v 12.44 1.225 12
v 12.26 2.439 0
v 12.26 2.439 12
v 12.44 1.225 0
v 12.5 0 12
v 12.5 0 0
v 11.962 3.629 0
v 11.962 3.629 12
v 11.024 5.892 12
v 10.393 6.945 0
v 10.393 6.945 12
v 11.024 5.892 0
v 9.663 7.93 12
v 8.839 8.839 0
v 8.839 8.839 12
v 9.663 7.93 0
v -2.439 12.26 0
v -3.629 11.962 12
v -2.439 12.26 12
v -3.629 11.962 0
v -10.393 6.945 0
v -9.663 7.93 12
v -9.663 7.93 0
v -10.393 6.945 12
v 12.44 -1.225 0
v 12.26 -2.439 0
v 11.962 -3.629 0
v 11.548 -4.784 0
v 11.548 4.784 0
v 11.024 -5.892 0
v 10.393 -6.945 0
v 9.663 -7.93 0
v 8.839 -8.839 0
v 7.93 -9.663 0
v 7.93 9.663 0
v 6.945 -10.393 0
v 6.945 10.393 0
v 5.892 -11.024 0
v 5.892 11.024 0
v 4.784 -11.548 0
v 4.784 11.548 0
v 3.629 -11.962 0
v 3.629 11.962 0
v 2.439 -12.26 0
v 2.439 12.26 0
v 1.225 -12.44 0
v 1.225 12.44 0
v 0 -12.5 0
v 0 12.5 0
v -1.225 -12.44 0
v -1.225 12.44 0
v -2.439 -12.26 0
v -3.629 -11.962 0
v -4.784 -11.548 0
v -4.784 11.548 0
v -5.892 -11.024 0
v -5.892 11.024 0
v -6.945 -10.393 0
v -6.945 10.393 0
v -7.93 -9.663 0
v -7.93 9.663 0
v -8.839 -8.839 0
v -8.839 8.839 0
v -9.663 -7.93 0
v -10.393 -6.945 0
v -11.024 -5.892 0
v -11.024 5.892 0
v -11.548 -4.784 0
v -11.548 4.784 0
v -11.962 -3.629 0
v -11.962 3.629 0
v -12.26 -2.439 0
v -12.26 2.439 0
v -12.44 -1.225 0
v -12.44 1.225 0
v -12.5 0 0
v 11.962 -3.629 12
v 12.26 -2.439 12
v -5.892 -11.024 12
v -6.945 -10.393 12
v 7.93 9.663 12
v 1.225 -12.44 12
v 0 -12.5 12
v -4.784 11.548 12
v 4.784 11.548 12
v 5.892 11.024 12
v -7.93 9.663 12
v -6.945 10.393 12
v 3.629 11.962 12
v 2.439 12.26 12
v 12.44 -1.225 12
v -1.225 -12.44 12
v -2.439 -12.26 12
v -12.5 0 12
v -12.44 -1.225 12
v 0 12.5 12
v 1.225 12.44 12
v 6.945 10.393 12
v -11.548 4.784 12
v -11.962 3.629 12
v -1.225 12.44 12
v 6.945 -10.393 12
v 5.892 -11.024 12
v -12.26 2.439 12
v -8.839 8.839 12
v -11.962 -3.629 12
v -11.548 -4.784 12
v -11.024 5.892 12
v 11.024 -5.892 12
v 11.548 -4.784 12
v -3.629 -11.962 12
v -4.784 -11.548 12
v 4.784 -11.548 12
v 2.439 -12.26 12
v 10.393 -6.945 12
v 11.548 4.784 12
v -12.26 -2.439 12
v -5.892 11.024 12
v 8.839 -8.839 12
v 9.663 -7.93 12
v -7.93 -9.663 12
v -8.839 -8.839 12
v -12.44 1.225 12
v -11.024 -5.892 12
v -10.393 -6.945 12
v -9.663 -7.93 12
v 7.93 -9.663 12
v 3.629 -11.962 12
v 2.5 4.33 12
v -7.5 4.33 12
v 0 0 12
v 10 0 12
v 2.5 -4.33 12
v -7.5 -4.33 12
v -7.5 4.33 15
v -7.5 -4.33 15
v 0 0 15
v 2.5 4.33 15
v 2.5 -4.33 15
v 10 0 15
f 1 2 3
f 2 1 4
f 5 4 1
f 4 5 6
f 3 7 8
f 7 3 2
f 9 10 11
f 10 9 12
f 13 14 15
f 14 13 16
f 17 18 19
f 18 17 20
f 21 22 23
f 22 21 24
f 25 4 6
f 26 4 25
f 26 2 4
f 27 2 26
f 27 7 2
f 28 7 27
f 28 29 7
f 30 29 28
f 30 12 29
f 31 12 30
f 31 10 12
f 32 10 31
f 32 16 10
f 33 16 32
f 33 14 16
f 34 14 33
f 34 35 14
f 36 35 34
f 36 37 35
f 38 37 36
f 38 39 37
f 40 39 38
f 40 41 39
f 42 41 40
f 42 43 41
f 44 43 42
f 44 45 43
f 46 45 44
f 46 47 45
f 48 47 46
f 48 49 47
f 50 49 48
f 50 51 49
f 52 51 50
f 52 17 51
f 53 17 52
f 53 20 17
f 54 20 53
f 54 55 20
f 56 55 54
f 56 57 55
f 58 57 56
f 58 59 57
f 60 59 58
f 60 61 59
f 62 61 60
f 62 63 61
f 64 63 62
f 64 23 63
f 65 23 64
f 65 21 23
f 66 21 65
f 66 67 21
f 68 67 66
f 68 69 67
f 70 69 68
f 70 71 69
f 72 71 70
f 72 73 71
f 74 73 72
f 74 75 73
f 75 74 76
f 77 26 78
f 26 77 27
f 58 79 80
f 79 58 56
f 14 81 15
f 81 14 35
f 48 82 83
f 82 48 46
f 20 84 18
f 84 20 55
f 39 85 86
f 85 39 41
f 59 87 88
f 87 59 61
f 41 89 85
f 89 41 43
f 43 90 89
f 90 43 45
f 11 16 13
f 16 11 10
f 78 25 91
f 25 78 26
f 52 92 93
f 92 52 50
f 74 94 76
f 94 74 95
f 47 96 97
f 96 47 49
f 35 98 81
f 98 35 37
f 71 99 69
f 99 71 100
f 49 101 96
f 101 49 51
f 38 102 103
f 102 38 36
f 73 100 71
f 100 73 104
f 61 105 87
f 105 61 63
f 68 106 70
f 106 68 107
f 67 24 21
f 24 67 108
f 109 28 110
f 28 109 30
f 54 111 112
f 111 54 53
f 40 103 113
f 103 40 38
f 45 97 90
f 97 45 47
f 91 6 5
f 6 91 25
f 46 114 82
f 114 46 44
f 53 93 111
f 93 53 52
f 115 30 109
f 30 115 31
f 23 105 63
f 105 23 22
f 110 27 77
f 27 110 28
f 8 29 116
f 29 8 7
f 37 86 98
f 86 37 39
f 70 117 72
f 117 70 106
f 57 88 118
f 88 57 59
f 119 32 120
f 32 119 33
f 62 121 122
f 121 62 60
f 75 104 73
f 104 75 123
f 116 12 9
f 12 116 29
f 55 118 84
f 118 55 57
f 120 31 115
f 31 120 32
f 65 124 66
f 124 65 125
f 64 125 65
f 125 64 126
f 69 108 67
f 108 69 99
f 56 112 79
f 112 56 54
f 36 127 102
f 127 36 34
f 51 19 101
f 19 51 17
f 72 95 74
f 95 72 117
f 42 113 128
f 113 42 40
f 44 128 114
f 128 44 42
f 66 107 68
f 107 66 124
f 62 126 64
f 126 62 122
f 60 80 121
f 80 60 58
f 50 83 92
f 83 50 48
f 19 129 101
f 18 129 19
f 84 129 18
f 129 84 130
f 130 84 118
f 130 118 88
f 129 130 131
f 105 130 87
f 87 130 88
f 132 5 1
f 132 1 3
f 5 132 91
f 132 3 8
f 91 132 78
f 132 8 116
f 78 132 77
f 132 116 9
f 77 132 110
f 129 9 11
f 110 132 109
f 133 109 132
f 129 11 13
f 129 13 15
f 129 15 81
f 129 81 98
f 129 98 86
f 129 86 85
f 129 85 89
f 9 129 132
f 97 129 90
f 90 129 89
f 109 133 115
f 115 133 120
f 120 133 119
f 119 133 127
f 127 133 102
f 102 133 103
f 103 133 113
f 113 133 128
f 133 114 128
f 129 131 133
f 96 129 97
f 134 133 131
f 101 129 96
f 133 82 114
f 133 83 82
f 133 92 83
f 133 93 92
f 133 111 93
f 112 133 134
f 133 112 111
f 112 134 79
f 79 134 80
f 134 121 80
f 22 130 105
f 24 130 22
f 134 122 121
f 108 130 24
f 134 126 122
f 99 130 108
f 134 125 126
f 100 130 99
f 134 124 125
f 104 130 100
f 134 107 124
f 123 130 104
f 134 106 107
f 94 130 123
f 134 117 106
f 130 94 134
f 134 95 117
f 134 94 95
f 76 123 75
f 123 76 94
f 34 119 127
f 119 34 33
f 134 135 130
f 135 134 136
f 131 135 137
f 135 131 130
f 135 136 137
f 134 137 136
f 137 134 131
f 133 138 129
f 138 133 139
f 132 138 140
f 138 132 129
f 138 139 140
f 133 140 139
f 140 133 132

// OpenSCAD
$fn = 64;


cylinder(d=25, h=12);


translate([-5,0,0])cylinder(d=10, h=15, $fn=3);

translate([5,0,0])cylinder(d=10, h=15, $fn=3);
